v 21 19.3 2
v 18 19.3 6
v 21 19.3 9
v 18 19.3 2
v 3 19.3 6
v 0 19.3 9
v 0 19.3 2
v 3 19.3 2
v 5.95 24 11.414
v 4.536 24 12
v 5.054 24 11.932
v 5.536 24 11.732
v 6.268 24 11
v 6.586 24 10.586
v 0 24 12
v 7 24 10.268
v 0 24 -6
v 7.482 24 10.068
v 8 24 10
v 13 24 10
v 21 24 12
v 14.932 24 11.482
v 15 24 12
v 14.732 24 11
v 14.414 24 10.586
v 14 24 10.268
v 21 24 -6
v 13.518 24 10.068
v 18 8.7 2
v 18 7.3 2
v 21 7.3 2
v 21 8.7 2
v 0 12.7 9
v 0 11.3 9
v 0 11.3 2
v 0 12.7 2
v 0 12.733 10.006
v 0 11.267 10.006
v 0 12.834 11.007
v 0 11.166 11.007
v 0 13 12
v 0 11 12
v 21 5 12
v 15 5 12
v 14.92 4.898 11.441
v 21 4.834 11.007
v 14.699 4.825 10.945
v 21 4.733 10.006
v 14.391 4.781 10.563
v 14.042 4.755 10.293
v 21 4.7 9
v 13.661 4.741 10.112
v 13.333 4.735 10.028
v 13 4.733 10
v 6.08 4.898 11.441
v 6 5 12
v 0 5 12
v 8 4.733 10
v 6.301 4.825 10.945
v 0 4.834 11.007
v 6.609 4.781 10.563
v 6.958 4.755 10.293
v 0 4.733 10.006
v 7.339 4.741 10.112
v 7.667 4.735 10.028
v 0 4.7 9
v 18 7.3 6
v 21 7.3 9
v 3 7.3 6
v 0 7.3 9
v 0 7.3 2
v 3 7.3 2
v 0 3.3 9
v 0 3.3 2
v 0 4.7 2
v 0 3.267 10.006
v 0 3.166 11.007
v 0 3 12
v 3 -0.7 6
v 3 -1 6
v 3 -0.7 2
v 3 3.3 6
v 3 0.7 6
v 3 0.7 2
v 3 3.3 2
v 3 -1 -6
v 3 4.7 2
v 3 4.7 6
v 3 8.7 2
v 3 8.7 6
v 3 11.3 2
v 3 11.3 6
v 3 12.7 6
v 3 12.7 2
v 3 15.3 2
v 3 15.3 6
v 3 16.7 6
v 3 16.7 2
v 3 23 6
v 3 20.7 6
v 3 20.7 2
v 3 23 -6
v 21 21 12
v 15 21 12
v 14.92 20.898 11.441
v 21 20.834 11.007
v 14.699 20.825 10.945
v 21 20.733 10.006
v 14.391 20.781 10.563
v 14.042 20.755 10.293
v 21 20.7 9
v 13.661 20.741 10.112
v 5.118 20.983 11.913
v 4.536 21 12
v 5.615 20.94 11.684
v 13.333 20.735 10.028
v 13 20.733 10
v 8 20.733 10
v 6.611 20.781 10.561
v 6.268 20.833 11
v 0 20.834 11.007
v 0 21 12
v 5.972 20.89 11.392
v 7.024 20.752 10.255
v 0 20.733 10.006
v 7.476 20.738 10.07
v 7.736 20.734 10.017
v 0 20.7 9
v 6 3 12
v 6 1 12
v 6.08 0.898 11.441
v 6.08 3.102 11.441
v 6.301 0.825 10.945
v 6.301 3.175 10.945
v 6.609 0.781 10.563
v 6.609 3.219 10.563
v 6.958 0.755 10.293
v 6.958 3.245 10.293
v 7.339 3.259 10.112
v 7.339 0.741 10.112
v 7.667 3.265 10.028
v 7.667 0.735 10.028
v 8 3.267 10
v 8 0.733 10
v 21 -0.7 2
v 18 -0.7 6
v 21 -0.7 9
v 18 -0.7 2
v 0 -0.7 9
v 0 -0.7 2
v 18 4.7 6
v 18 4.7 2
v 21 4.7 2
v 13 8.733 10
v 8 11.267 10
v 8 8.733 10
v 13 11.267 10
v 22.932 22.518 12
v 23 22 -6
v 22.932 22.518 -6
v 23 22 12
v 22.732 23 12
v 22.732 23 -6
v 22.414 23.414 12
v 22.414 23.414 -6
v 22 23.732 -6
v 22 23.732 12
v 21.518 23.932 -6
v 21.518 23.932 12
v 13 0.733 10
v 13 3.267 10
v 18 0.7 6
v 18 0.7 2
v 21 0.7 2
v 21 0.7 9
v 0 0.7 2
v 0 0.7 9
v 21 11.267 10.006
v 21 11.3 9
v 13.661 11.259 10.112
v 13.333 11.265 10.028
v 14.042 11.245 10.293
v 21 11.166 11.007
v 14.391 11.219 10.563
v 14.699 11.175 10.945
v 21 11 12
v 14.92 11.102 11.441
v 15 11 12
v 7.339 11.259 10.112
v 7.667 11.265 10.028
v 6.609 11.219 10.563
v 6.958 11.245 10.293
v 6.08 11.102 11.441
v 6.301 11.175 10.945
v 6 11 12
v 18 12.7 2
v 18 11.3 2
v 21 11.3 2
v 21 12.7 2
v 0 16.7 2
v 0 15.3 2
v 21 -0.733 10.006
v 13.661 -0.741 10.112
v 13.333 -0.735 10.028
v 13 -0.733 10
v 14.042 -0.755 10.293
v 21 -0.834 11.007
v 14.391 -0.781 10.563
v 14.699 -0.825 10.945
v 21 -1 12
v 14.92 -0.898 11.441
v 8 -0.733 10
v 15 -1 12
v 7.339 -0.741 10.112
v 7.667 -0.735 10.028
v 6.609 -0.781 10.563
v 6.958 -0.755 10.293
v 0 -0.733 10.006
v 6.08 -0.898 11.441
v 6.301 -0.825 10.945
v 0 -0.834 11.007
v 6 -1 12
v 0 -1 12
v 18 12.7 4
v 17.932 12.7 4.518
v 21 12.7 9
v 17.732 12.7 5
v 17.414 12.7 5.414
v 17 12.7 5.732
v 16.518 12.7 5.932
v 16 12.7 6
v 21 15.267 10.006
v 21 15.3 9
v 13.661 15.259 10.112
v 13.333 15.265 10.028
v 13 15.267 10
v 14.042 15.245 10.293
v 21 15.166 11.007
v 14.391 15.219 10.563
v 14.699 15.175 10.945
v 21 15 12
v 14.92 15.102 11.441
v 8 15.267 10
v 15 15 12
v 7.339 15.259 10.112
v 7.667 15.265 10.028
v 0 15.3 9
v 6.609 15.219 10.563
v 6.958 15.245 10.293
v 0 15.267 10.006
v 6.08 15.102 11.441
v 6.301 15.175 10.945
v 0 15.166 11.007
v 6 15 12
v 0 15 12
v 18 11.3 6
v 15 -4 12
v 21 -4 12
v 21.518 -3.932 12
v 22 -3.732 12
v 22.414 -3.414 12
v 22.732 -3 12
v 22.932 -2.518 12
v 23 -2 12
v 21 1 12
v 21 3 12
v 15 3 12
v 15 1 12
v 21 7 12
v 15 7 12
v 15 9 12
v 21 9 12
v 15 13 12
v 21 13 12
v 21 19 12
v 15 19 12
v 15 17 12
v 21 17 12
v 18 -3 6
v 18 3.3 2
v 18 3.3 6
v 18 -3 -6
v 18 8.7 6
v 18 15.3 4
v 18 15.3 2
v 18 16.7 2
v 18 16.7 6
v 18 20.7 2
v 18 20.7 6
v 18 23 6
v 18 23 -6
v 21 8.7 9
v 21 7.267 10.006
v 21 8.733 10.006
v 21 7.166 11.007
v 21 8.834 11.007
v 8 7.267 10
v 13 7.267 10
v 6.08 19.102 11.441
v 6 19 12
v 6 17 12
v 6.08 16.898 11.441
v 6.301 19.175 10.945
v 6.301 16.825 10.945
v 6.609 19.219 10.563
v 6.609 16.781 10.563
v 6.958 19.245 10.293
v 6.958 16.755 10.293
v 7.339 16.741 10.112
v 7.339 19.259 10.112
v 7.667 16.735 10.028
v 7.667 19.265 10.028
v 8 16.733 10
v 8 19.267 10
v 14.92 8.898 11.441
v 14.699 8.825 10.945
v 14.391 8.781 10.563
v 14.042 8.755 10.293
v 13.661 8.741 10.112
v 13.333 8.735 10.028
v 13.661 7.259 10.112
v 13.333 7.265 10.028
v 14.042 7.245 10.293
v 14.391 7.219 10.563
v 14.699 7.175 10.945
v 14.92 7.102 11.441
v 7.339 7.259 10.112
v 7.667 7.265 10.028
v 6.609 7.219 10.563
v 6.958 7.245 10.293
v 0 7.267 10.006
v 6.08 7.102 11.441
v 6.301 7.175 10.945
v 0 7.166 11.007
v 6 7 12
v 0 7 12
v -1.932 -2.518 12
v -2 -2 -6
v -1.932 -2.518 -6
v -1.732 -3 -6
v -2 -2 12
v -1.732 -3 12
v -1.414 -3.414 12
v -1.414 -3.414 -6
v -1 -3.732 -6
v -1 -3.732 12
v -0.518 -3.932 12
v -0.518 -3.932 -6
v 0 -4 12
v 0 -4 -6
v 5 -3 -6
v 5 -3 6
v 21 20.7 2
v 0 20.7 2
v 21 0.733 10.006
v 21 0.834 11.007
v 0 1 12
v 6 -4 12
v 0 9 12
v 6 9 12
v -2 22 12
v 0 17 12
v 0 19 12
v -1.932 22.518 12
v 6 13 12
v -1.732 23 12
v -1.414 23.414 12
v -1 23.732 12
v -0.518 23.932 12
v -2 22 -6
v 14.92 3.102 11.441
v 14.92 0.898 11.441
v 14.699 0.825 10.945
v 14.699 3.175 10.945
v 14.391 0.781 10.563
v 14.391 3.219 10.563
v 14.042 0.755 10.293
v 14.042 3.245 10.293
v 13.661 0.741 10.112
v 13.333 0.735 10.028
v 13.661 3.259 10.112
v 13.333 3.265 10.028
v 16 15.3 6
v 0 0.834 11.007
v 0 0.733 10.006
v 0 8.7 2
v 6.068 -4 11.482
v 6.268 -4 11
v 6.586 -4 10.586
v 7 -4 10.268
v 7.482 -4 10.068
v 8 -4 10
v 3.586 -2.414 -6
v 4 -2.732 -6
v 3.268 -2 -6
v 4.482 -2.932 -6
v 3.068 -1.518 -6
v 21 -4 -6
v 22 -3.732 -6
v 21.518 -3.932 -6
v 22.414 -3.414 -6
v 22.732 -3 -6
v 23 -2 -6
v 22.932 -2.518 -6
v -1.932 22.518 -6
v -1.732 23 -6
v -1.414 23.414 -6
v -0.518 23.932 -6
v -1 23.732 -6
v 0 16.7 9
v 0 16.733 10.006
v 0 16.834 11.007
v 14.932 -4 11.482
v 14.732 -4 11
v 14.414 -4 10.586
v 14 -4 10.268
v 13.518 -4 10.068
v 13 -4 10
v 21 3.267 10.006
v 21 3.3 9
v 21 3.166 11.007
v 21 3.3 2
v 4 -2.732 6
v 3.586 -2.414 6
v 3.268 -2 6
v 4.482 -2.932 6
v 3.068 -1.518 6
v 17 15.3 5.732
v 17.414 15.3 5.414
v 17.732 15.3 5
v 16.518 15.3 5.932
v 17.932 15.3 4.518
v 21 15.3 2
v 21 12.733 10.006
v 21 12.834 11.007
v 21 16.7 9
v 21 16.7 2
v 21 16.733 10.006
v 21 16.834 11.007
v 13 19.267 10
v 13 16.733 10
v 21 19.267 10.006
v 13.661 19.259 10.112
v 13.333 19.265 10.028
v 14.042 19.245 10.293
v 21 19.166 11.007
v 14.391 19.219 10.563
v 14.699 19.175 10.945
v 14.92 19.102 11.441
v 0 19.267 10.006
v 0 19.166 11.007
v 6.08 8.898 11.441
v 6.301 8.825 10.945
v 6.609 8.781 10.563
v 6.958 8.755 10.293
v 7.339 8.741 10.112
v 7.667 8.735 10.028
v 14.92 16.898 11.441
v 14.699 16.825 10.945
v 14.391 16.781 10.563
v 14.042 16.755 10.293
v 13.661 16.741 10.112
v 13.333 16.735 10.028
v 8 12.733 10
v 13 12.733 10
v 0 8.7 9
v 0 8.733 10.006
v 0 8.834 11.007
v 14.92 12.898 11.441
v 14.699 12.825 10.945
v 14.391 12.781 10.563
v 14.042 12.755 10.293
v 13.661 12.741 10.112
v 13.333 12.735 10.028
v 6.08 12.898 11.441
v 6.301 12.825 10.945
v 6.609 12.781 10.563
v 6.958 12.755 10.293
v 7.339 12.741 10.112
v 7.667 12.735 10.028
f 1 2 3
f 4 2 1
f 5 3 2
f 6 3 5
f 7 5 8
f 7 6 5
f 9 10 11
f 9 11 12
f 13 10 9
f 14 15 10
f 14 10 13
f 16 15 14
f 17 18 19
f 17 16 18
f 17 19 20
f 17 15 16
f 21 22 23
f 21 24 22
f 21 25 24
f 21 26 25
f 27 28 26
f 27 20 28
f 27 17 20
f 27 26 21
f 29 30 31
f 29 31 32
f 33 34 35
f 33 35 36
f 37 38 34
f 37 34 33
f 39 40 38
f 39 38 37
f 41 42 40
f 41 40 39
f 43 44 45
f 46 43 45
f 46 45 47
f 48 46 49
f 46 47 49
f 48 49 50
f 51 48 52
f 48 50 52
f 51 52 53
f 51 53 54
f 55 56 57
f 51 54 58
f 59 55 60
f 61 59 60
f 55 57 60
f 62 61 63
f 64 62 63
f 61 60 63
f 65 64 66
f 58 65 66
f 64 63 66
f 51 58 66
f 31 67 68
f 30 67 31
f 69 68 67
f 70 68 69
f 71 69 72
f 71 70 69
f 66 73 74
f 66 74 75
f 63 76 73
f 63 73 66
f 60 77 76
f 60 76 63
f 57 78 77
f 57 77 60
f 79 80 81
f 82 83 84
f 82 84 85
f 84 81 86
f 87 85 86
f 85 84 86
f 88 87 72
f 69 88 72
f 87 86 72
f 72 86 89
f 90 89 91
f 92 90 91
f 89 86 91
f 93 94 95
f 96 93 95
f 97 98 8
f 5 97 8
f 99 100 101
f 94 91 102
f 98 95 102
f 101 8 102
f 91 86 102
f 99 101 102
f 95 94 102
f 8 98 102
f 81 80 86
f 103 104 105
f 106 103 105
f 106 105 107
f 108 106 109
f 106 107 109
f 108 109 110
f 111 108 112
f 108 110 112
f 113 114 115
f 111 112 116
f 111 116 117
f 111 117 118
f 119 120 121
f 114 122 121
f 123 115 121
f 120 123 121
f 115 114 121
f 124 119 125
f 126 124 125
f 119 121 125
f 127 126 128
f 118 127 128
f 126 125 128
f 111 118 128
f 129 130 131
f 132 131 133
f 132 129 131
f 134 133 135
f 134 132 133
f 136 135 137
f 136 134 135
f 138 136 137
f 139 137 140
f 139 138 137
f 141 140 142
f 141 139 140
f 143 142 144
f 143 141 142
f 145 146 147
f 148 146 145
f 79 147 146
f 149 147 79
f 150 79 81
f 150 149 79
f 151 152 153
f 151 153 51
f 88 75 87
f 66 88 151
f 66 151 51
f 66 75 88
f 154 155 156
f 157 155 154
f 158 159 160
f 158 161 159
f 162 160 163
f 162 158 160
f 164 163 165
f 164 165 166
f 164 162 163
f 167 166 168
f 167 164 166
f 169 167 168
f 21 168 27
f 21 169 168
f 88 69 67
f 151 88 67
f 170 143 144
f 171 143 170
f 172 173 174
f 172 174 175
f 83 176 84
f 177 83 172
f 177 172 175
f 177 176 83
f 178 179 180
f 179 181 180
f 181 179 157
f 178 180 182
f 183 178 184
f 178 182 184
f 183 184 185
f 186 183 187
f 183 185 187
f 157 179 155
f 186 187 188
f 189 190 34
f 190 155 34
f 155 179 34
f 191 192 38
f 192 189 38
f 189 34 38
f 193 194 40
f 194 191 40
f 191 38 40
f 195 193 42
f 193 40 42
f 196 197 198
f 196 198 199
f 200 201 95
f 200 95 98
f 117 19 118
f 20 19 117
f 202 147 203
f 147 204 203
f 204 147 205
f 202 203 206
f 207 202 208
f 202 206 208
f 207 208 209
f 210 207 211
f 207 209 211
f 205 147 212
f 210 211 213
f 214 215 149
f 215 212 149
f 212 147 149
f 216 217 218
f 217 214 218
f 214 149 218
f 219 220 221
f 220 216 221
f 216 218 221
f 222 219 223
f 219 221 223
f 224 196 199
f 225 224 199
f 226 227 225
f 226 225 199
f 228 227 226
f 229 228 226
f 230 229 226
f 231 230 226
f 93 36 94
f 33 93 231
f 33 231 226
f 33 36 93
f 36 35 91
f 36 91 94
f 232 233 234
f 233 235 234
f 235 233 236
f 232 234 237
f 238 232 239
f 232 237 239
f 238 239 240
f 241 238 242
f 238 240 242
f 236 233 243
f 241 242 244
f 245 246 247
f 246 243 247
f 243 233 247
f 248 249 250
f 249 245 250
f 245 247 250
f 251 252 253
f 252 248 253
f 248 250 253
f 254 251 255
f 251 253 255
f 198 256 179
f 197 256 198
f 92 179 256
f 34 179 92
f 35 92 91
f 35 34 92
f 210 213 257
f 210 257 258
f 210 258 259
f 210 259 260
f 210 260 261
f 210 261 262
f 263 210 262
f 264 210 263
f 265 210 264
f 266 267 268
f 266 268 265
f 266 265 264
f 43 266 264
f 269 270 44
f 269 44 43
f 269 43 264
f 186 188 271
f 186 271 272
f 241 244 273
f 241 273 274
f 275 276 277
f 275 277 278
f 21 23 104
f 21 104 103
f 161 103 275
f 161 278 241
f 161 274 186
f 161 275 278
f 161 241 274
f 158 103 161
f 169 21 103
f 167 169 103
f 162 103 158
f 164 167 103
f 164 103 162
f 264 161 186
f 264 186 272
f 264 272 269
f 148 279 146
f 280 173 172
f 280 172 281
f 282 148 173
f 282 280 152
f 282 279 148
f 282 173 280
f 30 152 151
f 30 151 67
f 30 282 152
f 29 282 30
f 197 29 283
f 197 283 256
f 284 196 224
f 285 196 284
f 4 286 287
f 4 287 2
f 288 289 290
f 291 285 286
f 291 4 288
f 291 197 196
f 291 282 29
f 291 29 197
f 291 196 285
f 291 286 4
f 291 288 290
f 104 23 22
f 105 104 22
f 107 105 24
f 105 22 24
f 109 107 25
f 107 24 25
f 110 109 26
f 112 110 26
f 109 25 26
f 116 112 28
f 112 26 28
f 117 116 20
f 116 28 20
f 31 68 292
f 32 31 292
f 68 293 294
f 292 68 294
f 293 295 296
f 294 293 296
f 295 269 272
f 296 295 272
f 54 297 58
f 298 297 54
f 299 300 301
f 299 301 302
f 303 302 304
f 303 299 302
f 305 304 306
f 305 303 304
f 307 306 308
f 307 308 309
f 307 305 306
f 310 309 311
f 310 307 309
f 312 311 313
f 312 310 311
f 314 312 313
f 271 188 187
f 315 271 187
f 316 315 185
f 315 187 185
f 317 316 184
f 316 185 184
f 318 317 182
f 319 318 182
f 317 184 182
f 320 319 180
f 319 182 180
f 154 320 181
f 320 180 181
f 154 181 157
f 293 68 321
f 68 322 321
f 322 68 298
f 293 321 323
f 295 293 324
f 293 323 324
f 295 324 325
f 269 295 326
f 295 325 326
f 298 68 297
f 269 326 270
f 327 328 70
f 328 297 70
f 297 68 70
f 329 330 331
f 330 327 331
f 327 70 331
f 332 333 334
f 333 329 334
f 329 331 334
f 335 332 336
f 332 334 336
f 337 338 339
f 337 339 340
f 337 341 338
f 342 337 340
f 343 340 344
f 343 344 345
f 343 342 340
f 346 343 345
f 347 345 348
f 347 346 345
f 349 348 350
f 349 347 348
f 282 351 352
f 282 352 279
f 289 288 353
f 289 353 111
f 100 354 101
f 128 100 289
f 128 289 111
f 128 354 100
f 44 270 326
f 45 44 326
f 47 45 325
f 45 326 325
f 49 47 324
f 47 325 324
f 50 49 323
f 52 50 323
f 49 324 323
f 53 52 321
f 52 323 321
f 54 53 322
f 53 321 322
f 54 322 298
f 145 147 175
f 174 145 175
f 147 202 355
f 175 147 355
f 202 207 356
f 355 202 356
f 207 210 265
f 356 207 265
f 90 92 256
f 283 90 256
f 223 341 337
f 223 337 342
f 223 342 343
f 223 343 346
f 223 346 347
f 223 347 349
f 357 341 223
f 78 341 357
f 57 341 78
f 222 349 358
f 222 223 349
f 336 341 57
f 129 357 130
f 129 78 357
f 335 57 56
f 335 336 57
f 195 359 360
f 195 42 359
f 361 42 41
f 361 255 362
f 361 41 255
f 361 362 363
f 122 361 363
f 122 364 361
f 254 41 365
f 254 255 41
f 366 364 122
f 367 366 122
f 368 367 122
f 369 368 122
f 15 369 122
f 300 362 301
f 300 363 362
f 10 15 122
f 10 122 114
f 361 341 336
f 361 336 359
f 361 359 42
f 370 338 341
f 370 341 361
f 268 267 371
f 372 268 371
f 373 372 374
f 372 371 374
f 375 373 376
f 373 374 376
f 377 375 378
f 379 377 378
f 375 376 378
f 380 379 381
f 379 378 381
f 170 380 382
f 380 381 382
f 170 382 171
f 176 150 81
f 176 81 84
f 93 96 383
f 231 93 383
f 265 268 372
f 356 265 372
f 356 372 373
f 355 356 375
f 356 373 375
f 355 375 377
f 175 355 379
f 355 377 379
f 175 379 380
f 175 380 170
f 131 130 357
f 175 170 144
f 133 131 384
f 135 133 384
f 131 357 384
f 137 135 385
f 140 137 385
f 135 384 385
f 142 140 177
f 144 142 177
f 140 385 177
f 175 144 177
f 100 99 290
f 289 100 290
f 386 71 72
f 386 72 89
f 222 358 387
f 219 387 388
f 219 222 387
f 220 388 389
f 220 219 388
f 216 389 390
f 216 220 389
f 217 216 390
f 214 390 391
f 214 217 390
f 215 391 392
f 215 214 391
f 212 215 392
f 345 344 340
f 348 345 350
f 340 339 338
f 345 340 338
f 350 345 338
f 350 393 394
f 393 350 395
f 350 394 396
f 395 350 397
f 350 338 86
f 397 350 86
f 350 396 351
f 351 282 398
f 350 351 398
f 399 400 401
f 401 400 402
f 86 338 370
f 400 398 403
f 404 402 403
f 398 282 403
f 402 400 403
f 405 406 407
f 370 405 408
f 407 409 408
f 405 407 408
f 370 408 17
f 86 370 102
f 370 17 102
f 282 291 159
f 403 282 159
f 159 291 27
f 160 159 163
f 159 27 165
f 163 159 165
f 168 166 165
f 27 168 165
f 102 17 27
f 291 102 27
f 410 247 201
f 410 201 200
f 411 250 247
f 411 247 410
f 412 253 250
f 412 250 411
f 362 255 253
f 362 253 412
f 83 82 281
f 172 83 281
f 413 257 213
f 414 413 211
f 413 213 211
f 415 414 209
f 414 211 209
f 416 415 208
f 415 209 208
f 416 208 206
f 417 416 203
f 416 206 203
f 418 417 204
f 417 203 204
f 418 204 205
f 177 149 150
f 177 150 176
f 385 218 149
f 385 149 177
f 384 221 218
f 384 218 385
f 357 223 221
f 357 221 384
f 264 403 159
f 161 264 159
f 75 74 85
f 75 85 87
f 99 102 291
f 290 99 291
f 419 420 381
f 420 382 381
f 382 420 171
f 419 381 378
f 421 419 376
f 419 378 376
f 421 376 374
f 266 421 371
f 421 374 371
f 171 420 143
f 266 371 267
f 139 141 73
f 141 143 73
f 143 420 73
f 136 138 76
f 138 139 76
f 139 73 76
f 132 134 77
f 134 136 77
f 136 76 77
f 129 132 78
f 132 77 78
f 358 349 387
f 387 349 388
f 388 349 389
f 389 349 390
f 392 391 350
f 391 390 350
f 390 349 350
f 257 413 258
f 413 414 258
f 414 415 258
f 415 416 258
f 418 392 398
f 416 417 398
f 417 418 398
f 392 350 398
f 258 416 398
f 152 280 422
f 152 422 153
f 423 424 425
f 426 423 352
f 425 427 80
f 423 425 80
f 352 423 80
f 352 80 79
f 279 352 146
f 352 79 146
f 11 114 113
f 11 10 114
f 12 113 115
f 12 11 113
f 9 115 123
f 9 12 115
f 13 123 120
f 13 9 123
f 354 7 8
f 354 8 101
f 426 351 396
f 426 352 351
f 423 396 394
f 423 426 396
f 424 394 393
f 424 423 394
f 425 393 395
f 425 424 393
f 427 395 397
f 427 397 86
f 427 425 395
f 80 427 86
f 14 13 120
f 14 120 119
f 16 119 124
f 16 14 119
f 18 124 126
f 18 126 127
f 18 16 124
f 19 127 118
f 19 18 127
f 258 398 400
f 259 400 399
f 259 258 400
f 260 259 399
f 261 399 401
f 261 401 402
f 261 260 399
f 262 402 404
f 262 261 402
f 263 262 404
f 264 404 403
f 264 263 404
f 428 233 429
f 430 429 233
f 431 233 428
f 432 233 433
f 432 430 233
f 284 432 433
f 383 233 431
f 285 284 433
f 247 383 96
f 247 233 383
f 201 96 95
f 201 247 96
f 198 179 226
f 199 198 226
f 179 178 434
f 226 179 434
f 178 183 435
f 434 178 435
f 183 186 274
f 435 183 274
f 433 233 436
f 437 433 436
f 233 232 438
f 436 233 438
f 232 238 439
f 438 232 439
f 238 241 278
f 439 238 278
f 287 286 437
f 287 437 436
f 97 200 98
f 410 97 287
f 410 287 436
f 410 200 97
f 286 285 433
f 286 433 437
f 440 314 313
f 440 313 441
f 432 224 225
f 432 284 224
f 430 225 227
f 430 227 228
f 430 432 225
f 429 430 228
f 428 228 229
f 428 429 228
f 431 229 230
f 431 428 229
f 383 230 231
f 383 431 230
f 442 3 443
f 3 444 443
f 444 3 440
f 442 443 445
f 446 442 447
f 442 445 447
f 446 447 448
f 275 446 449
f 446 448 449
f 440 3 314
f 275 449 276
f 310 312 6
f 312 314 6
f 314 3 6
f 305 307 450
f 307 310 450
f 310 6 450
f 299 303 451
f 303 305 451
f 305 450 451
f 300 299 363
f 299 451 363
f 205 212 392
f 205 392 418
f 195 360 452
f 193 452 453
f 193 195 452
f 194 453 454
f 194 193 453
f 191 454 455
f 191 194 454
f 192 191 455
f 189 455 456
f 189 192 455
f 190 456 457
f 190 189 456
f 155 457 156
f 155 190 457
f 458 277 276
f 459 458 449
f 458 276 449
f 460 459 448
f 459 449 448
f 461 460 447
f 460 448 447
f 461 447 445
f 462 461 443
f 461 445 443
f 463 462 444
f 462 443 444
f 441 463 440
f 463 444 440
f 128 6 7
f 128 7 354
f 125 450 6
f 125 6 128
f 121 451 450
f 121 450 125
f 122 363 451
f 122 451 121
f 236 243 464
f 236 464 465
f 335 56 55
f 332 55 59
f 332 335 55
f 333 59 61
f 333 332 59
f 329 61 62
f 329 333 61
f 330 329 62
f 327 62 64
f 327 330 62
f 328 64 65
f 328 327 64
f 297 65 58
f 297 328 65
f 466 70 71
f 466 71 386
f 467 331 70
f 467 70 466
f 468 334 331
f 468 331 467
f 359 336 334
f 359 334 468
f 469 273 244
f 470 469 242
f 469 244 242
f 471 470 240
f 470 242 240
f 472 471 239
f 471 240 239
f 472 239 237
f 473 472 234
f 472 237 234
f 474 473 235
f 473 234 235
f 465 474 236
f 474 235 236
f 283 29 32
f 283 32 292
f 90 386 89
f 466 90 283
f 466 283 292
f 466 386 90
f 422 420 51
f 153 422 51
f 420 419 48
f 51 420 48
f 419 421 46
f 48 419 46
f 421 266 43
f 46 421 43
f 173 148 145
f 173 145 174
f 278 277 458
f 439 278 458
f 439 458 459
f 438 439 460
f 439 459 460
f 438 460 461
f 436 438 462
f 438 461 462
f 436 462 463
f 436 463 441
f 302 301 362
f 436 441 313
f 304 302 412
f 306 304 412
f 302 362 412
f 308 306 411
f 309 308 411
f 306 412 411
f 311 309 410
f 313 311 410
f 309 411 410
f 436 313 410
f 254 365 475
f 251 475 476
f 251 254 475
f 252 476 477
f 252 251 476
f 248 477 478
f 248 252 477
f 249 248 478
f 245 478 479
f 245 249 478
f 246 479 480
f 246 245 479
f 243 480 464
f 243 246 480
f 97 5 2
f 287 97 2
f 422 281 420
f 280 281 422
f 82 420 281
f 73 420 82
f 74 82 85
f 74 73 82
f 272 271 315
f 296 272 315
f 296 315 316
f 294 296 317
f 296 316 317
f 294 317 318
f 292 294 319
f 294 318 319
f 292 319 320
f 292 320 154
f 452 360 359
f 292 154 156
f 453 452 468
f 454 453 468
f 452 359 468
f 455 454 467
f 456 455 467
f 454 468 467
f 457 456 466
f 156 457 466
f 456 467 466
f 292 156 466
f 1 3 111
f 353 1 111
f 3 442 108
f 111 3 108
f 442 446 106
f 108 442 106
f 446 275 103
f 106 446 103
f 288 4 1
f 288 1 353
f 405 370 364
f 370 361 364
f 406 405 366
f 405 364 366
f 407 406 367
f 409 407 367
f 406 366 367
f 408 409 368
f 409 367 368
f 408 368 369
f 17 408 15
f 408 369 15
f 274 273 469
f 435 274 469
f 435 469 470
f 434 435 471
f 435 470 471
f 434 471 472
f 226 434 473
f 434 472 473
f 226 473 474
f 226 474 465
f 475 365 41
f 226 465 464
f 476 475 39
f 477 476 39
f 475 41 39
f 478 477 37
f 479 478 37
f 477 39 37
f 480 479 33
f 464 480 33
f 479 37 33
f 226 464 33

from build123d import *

# Parameters (mm, degrees)
BOX004_W         = 15
BOX004_H         = 26
BOX004_DEPTH     = 12
BOX005_W         = 9
BOX005_H         = 32
BOX005_DEPTH     = 8
FILLET004_R      = 2
PAD001_DEPTH     = 21
ARRAY001_Y_COUNT = 6
ARRAY001_Y_PITCH = 4
BOX003_W         = 25
BOX003_H         = 28
BOX003_DEPTH     = 18
FILLET003_R      = 2
FILLET005_R      = 2


with BuildPart() as cover_internal_cube:
    # Box004 → Box004 (new body)
    with BuildSketch(Plane(origin=(3, -3, -6), x_dir=(1, 0, 0), z_dir=(0, 0, 1))):
        with Locations((7.5, 13)):
            Rectangle(BOX004_W, BOX004_H)
    extrude(amount=BOX004_DEPTH)


with BuildPart() as middle_extract_cube_fillet001:
    # Box005 → Box005 (new body)
    with BuildSketch(Plane(origin=(6, -6, 10), x_dir=(1, 0, 0), z_dir=(0, 0, 1))):
        with Locations((4.5, 16)):
            Rectangle(BOX005_W, BOX005_H)
    extrude(amount=BOX005_DEPTH)

    # Fillet004
    fillet004_edges = [middle_extract_cube_fillet001.edges().sort_by_distance(p)[0] for p in [
        (6, 10, 10),
        (15, 10, 10),
    ]]
    fillet(fillet004_edges, radius=FILLET004_R)


with BuildPart() as extract_fusion001:
    # Sketch001 → Pad001 (new body)
    with BuildSketch(Plane.YZ):
        with BuildLine():
            Line((-0.7, 9), (-0.7, 2))
            Line((-0.7, 2), (0.7, 2))
            Line((0.7, 2), (0.7, 9))
            ThreePointArc((1, 12), (0.775187, 10.507481), (0.7, 9))
            Line((-1, 12), (1, 12))
            ThreePointArc((-0.7, 9), (-0.775187, 10.507481), (-1, 12))
        make_face()
    extrude(amount=PAD001_DEPTH)

    # Array001 Y: extract fusion001 ×6


with BuildPart() as extract_fusion001_1:
    add(extract_fusion001.part)
    with Locations(*[(0, i * ARRAY001_Y_PITCH, 0) for i in range(1, ARRAY001_Y_COUNT)]):
        add(extract_fusion001.part)

    # Fusion001: union cover internal cube, middle extract cube fillet001
    add(cover_internal_cube.part)
    add(middle_extract_cube_fillet001.part)


with BuildPart() as cover_glass_box_fillet:
    # Box003 → Box003 (new body)
    with BuildSketch(Plane(origin=(-2, -4, -6), x_dir=(1, 0, 0), z_dir=(0, 0, 1))):
        with Locations((12.5, 14)):
            Rectangle(BOX003_W, BOX003_H)
    extrude(amount=BOX003_DEPTH)

    # Fillet003
    fillet003_edges = [cover_glass_box_fillet.edges().sort_by_distance(p)[0] for p in [
        (-2, -4, 3),
        (-2, 24, 3),
        (23, -4, 3),
        (23, 24, 3),
    ]]
    fillet(fillet003_edges, radius=FILLET003_R)

    # Cut001: cut extract fusion001
    add(extract_fusion001_1.part, mode=Mode.SUBTRACT)

    # Fillet005
    fillet005_edges = [cover_glass_box_fillet.edges().sort_by_distance(p)[0] for p in [
        (6, 22.5, 12),
        (0, -4, 3),
        (3, -3, 0),
        (18, 14, 6),
    ]]
    fillet(fillet005_edges, radius=FILLET005_R)


solid = cover_glass_box_fillet.part
